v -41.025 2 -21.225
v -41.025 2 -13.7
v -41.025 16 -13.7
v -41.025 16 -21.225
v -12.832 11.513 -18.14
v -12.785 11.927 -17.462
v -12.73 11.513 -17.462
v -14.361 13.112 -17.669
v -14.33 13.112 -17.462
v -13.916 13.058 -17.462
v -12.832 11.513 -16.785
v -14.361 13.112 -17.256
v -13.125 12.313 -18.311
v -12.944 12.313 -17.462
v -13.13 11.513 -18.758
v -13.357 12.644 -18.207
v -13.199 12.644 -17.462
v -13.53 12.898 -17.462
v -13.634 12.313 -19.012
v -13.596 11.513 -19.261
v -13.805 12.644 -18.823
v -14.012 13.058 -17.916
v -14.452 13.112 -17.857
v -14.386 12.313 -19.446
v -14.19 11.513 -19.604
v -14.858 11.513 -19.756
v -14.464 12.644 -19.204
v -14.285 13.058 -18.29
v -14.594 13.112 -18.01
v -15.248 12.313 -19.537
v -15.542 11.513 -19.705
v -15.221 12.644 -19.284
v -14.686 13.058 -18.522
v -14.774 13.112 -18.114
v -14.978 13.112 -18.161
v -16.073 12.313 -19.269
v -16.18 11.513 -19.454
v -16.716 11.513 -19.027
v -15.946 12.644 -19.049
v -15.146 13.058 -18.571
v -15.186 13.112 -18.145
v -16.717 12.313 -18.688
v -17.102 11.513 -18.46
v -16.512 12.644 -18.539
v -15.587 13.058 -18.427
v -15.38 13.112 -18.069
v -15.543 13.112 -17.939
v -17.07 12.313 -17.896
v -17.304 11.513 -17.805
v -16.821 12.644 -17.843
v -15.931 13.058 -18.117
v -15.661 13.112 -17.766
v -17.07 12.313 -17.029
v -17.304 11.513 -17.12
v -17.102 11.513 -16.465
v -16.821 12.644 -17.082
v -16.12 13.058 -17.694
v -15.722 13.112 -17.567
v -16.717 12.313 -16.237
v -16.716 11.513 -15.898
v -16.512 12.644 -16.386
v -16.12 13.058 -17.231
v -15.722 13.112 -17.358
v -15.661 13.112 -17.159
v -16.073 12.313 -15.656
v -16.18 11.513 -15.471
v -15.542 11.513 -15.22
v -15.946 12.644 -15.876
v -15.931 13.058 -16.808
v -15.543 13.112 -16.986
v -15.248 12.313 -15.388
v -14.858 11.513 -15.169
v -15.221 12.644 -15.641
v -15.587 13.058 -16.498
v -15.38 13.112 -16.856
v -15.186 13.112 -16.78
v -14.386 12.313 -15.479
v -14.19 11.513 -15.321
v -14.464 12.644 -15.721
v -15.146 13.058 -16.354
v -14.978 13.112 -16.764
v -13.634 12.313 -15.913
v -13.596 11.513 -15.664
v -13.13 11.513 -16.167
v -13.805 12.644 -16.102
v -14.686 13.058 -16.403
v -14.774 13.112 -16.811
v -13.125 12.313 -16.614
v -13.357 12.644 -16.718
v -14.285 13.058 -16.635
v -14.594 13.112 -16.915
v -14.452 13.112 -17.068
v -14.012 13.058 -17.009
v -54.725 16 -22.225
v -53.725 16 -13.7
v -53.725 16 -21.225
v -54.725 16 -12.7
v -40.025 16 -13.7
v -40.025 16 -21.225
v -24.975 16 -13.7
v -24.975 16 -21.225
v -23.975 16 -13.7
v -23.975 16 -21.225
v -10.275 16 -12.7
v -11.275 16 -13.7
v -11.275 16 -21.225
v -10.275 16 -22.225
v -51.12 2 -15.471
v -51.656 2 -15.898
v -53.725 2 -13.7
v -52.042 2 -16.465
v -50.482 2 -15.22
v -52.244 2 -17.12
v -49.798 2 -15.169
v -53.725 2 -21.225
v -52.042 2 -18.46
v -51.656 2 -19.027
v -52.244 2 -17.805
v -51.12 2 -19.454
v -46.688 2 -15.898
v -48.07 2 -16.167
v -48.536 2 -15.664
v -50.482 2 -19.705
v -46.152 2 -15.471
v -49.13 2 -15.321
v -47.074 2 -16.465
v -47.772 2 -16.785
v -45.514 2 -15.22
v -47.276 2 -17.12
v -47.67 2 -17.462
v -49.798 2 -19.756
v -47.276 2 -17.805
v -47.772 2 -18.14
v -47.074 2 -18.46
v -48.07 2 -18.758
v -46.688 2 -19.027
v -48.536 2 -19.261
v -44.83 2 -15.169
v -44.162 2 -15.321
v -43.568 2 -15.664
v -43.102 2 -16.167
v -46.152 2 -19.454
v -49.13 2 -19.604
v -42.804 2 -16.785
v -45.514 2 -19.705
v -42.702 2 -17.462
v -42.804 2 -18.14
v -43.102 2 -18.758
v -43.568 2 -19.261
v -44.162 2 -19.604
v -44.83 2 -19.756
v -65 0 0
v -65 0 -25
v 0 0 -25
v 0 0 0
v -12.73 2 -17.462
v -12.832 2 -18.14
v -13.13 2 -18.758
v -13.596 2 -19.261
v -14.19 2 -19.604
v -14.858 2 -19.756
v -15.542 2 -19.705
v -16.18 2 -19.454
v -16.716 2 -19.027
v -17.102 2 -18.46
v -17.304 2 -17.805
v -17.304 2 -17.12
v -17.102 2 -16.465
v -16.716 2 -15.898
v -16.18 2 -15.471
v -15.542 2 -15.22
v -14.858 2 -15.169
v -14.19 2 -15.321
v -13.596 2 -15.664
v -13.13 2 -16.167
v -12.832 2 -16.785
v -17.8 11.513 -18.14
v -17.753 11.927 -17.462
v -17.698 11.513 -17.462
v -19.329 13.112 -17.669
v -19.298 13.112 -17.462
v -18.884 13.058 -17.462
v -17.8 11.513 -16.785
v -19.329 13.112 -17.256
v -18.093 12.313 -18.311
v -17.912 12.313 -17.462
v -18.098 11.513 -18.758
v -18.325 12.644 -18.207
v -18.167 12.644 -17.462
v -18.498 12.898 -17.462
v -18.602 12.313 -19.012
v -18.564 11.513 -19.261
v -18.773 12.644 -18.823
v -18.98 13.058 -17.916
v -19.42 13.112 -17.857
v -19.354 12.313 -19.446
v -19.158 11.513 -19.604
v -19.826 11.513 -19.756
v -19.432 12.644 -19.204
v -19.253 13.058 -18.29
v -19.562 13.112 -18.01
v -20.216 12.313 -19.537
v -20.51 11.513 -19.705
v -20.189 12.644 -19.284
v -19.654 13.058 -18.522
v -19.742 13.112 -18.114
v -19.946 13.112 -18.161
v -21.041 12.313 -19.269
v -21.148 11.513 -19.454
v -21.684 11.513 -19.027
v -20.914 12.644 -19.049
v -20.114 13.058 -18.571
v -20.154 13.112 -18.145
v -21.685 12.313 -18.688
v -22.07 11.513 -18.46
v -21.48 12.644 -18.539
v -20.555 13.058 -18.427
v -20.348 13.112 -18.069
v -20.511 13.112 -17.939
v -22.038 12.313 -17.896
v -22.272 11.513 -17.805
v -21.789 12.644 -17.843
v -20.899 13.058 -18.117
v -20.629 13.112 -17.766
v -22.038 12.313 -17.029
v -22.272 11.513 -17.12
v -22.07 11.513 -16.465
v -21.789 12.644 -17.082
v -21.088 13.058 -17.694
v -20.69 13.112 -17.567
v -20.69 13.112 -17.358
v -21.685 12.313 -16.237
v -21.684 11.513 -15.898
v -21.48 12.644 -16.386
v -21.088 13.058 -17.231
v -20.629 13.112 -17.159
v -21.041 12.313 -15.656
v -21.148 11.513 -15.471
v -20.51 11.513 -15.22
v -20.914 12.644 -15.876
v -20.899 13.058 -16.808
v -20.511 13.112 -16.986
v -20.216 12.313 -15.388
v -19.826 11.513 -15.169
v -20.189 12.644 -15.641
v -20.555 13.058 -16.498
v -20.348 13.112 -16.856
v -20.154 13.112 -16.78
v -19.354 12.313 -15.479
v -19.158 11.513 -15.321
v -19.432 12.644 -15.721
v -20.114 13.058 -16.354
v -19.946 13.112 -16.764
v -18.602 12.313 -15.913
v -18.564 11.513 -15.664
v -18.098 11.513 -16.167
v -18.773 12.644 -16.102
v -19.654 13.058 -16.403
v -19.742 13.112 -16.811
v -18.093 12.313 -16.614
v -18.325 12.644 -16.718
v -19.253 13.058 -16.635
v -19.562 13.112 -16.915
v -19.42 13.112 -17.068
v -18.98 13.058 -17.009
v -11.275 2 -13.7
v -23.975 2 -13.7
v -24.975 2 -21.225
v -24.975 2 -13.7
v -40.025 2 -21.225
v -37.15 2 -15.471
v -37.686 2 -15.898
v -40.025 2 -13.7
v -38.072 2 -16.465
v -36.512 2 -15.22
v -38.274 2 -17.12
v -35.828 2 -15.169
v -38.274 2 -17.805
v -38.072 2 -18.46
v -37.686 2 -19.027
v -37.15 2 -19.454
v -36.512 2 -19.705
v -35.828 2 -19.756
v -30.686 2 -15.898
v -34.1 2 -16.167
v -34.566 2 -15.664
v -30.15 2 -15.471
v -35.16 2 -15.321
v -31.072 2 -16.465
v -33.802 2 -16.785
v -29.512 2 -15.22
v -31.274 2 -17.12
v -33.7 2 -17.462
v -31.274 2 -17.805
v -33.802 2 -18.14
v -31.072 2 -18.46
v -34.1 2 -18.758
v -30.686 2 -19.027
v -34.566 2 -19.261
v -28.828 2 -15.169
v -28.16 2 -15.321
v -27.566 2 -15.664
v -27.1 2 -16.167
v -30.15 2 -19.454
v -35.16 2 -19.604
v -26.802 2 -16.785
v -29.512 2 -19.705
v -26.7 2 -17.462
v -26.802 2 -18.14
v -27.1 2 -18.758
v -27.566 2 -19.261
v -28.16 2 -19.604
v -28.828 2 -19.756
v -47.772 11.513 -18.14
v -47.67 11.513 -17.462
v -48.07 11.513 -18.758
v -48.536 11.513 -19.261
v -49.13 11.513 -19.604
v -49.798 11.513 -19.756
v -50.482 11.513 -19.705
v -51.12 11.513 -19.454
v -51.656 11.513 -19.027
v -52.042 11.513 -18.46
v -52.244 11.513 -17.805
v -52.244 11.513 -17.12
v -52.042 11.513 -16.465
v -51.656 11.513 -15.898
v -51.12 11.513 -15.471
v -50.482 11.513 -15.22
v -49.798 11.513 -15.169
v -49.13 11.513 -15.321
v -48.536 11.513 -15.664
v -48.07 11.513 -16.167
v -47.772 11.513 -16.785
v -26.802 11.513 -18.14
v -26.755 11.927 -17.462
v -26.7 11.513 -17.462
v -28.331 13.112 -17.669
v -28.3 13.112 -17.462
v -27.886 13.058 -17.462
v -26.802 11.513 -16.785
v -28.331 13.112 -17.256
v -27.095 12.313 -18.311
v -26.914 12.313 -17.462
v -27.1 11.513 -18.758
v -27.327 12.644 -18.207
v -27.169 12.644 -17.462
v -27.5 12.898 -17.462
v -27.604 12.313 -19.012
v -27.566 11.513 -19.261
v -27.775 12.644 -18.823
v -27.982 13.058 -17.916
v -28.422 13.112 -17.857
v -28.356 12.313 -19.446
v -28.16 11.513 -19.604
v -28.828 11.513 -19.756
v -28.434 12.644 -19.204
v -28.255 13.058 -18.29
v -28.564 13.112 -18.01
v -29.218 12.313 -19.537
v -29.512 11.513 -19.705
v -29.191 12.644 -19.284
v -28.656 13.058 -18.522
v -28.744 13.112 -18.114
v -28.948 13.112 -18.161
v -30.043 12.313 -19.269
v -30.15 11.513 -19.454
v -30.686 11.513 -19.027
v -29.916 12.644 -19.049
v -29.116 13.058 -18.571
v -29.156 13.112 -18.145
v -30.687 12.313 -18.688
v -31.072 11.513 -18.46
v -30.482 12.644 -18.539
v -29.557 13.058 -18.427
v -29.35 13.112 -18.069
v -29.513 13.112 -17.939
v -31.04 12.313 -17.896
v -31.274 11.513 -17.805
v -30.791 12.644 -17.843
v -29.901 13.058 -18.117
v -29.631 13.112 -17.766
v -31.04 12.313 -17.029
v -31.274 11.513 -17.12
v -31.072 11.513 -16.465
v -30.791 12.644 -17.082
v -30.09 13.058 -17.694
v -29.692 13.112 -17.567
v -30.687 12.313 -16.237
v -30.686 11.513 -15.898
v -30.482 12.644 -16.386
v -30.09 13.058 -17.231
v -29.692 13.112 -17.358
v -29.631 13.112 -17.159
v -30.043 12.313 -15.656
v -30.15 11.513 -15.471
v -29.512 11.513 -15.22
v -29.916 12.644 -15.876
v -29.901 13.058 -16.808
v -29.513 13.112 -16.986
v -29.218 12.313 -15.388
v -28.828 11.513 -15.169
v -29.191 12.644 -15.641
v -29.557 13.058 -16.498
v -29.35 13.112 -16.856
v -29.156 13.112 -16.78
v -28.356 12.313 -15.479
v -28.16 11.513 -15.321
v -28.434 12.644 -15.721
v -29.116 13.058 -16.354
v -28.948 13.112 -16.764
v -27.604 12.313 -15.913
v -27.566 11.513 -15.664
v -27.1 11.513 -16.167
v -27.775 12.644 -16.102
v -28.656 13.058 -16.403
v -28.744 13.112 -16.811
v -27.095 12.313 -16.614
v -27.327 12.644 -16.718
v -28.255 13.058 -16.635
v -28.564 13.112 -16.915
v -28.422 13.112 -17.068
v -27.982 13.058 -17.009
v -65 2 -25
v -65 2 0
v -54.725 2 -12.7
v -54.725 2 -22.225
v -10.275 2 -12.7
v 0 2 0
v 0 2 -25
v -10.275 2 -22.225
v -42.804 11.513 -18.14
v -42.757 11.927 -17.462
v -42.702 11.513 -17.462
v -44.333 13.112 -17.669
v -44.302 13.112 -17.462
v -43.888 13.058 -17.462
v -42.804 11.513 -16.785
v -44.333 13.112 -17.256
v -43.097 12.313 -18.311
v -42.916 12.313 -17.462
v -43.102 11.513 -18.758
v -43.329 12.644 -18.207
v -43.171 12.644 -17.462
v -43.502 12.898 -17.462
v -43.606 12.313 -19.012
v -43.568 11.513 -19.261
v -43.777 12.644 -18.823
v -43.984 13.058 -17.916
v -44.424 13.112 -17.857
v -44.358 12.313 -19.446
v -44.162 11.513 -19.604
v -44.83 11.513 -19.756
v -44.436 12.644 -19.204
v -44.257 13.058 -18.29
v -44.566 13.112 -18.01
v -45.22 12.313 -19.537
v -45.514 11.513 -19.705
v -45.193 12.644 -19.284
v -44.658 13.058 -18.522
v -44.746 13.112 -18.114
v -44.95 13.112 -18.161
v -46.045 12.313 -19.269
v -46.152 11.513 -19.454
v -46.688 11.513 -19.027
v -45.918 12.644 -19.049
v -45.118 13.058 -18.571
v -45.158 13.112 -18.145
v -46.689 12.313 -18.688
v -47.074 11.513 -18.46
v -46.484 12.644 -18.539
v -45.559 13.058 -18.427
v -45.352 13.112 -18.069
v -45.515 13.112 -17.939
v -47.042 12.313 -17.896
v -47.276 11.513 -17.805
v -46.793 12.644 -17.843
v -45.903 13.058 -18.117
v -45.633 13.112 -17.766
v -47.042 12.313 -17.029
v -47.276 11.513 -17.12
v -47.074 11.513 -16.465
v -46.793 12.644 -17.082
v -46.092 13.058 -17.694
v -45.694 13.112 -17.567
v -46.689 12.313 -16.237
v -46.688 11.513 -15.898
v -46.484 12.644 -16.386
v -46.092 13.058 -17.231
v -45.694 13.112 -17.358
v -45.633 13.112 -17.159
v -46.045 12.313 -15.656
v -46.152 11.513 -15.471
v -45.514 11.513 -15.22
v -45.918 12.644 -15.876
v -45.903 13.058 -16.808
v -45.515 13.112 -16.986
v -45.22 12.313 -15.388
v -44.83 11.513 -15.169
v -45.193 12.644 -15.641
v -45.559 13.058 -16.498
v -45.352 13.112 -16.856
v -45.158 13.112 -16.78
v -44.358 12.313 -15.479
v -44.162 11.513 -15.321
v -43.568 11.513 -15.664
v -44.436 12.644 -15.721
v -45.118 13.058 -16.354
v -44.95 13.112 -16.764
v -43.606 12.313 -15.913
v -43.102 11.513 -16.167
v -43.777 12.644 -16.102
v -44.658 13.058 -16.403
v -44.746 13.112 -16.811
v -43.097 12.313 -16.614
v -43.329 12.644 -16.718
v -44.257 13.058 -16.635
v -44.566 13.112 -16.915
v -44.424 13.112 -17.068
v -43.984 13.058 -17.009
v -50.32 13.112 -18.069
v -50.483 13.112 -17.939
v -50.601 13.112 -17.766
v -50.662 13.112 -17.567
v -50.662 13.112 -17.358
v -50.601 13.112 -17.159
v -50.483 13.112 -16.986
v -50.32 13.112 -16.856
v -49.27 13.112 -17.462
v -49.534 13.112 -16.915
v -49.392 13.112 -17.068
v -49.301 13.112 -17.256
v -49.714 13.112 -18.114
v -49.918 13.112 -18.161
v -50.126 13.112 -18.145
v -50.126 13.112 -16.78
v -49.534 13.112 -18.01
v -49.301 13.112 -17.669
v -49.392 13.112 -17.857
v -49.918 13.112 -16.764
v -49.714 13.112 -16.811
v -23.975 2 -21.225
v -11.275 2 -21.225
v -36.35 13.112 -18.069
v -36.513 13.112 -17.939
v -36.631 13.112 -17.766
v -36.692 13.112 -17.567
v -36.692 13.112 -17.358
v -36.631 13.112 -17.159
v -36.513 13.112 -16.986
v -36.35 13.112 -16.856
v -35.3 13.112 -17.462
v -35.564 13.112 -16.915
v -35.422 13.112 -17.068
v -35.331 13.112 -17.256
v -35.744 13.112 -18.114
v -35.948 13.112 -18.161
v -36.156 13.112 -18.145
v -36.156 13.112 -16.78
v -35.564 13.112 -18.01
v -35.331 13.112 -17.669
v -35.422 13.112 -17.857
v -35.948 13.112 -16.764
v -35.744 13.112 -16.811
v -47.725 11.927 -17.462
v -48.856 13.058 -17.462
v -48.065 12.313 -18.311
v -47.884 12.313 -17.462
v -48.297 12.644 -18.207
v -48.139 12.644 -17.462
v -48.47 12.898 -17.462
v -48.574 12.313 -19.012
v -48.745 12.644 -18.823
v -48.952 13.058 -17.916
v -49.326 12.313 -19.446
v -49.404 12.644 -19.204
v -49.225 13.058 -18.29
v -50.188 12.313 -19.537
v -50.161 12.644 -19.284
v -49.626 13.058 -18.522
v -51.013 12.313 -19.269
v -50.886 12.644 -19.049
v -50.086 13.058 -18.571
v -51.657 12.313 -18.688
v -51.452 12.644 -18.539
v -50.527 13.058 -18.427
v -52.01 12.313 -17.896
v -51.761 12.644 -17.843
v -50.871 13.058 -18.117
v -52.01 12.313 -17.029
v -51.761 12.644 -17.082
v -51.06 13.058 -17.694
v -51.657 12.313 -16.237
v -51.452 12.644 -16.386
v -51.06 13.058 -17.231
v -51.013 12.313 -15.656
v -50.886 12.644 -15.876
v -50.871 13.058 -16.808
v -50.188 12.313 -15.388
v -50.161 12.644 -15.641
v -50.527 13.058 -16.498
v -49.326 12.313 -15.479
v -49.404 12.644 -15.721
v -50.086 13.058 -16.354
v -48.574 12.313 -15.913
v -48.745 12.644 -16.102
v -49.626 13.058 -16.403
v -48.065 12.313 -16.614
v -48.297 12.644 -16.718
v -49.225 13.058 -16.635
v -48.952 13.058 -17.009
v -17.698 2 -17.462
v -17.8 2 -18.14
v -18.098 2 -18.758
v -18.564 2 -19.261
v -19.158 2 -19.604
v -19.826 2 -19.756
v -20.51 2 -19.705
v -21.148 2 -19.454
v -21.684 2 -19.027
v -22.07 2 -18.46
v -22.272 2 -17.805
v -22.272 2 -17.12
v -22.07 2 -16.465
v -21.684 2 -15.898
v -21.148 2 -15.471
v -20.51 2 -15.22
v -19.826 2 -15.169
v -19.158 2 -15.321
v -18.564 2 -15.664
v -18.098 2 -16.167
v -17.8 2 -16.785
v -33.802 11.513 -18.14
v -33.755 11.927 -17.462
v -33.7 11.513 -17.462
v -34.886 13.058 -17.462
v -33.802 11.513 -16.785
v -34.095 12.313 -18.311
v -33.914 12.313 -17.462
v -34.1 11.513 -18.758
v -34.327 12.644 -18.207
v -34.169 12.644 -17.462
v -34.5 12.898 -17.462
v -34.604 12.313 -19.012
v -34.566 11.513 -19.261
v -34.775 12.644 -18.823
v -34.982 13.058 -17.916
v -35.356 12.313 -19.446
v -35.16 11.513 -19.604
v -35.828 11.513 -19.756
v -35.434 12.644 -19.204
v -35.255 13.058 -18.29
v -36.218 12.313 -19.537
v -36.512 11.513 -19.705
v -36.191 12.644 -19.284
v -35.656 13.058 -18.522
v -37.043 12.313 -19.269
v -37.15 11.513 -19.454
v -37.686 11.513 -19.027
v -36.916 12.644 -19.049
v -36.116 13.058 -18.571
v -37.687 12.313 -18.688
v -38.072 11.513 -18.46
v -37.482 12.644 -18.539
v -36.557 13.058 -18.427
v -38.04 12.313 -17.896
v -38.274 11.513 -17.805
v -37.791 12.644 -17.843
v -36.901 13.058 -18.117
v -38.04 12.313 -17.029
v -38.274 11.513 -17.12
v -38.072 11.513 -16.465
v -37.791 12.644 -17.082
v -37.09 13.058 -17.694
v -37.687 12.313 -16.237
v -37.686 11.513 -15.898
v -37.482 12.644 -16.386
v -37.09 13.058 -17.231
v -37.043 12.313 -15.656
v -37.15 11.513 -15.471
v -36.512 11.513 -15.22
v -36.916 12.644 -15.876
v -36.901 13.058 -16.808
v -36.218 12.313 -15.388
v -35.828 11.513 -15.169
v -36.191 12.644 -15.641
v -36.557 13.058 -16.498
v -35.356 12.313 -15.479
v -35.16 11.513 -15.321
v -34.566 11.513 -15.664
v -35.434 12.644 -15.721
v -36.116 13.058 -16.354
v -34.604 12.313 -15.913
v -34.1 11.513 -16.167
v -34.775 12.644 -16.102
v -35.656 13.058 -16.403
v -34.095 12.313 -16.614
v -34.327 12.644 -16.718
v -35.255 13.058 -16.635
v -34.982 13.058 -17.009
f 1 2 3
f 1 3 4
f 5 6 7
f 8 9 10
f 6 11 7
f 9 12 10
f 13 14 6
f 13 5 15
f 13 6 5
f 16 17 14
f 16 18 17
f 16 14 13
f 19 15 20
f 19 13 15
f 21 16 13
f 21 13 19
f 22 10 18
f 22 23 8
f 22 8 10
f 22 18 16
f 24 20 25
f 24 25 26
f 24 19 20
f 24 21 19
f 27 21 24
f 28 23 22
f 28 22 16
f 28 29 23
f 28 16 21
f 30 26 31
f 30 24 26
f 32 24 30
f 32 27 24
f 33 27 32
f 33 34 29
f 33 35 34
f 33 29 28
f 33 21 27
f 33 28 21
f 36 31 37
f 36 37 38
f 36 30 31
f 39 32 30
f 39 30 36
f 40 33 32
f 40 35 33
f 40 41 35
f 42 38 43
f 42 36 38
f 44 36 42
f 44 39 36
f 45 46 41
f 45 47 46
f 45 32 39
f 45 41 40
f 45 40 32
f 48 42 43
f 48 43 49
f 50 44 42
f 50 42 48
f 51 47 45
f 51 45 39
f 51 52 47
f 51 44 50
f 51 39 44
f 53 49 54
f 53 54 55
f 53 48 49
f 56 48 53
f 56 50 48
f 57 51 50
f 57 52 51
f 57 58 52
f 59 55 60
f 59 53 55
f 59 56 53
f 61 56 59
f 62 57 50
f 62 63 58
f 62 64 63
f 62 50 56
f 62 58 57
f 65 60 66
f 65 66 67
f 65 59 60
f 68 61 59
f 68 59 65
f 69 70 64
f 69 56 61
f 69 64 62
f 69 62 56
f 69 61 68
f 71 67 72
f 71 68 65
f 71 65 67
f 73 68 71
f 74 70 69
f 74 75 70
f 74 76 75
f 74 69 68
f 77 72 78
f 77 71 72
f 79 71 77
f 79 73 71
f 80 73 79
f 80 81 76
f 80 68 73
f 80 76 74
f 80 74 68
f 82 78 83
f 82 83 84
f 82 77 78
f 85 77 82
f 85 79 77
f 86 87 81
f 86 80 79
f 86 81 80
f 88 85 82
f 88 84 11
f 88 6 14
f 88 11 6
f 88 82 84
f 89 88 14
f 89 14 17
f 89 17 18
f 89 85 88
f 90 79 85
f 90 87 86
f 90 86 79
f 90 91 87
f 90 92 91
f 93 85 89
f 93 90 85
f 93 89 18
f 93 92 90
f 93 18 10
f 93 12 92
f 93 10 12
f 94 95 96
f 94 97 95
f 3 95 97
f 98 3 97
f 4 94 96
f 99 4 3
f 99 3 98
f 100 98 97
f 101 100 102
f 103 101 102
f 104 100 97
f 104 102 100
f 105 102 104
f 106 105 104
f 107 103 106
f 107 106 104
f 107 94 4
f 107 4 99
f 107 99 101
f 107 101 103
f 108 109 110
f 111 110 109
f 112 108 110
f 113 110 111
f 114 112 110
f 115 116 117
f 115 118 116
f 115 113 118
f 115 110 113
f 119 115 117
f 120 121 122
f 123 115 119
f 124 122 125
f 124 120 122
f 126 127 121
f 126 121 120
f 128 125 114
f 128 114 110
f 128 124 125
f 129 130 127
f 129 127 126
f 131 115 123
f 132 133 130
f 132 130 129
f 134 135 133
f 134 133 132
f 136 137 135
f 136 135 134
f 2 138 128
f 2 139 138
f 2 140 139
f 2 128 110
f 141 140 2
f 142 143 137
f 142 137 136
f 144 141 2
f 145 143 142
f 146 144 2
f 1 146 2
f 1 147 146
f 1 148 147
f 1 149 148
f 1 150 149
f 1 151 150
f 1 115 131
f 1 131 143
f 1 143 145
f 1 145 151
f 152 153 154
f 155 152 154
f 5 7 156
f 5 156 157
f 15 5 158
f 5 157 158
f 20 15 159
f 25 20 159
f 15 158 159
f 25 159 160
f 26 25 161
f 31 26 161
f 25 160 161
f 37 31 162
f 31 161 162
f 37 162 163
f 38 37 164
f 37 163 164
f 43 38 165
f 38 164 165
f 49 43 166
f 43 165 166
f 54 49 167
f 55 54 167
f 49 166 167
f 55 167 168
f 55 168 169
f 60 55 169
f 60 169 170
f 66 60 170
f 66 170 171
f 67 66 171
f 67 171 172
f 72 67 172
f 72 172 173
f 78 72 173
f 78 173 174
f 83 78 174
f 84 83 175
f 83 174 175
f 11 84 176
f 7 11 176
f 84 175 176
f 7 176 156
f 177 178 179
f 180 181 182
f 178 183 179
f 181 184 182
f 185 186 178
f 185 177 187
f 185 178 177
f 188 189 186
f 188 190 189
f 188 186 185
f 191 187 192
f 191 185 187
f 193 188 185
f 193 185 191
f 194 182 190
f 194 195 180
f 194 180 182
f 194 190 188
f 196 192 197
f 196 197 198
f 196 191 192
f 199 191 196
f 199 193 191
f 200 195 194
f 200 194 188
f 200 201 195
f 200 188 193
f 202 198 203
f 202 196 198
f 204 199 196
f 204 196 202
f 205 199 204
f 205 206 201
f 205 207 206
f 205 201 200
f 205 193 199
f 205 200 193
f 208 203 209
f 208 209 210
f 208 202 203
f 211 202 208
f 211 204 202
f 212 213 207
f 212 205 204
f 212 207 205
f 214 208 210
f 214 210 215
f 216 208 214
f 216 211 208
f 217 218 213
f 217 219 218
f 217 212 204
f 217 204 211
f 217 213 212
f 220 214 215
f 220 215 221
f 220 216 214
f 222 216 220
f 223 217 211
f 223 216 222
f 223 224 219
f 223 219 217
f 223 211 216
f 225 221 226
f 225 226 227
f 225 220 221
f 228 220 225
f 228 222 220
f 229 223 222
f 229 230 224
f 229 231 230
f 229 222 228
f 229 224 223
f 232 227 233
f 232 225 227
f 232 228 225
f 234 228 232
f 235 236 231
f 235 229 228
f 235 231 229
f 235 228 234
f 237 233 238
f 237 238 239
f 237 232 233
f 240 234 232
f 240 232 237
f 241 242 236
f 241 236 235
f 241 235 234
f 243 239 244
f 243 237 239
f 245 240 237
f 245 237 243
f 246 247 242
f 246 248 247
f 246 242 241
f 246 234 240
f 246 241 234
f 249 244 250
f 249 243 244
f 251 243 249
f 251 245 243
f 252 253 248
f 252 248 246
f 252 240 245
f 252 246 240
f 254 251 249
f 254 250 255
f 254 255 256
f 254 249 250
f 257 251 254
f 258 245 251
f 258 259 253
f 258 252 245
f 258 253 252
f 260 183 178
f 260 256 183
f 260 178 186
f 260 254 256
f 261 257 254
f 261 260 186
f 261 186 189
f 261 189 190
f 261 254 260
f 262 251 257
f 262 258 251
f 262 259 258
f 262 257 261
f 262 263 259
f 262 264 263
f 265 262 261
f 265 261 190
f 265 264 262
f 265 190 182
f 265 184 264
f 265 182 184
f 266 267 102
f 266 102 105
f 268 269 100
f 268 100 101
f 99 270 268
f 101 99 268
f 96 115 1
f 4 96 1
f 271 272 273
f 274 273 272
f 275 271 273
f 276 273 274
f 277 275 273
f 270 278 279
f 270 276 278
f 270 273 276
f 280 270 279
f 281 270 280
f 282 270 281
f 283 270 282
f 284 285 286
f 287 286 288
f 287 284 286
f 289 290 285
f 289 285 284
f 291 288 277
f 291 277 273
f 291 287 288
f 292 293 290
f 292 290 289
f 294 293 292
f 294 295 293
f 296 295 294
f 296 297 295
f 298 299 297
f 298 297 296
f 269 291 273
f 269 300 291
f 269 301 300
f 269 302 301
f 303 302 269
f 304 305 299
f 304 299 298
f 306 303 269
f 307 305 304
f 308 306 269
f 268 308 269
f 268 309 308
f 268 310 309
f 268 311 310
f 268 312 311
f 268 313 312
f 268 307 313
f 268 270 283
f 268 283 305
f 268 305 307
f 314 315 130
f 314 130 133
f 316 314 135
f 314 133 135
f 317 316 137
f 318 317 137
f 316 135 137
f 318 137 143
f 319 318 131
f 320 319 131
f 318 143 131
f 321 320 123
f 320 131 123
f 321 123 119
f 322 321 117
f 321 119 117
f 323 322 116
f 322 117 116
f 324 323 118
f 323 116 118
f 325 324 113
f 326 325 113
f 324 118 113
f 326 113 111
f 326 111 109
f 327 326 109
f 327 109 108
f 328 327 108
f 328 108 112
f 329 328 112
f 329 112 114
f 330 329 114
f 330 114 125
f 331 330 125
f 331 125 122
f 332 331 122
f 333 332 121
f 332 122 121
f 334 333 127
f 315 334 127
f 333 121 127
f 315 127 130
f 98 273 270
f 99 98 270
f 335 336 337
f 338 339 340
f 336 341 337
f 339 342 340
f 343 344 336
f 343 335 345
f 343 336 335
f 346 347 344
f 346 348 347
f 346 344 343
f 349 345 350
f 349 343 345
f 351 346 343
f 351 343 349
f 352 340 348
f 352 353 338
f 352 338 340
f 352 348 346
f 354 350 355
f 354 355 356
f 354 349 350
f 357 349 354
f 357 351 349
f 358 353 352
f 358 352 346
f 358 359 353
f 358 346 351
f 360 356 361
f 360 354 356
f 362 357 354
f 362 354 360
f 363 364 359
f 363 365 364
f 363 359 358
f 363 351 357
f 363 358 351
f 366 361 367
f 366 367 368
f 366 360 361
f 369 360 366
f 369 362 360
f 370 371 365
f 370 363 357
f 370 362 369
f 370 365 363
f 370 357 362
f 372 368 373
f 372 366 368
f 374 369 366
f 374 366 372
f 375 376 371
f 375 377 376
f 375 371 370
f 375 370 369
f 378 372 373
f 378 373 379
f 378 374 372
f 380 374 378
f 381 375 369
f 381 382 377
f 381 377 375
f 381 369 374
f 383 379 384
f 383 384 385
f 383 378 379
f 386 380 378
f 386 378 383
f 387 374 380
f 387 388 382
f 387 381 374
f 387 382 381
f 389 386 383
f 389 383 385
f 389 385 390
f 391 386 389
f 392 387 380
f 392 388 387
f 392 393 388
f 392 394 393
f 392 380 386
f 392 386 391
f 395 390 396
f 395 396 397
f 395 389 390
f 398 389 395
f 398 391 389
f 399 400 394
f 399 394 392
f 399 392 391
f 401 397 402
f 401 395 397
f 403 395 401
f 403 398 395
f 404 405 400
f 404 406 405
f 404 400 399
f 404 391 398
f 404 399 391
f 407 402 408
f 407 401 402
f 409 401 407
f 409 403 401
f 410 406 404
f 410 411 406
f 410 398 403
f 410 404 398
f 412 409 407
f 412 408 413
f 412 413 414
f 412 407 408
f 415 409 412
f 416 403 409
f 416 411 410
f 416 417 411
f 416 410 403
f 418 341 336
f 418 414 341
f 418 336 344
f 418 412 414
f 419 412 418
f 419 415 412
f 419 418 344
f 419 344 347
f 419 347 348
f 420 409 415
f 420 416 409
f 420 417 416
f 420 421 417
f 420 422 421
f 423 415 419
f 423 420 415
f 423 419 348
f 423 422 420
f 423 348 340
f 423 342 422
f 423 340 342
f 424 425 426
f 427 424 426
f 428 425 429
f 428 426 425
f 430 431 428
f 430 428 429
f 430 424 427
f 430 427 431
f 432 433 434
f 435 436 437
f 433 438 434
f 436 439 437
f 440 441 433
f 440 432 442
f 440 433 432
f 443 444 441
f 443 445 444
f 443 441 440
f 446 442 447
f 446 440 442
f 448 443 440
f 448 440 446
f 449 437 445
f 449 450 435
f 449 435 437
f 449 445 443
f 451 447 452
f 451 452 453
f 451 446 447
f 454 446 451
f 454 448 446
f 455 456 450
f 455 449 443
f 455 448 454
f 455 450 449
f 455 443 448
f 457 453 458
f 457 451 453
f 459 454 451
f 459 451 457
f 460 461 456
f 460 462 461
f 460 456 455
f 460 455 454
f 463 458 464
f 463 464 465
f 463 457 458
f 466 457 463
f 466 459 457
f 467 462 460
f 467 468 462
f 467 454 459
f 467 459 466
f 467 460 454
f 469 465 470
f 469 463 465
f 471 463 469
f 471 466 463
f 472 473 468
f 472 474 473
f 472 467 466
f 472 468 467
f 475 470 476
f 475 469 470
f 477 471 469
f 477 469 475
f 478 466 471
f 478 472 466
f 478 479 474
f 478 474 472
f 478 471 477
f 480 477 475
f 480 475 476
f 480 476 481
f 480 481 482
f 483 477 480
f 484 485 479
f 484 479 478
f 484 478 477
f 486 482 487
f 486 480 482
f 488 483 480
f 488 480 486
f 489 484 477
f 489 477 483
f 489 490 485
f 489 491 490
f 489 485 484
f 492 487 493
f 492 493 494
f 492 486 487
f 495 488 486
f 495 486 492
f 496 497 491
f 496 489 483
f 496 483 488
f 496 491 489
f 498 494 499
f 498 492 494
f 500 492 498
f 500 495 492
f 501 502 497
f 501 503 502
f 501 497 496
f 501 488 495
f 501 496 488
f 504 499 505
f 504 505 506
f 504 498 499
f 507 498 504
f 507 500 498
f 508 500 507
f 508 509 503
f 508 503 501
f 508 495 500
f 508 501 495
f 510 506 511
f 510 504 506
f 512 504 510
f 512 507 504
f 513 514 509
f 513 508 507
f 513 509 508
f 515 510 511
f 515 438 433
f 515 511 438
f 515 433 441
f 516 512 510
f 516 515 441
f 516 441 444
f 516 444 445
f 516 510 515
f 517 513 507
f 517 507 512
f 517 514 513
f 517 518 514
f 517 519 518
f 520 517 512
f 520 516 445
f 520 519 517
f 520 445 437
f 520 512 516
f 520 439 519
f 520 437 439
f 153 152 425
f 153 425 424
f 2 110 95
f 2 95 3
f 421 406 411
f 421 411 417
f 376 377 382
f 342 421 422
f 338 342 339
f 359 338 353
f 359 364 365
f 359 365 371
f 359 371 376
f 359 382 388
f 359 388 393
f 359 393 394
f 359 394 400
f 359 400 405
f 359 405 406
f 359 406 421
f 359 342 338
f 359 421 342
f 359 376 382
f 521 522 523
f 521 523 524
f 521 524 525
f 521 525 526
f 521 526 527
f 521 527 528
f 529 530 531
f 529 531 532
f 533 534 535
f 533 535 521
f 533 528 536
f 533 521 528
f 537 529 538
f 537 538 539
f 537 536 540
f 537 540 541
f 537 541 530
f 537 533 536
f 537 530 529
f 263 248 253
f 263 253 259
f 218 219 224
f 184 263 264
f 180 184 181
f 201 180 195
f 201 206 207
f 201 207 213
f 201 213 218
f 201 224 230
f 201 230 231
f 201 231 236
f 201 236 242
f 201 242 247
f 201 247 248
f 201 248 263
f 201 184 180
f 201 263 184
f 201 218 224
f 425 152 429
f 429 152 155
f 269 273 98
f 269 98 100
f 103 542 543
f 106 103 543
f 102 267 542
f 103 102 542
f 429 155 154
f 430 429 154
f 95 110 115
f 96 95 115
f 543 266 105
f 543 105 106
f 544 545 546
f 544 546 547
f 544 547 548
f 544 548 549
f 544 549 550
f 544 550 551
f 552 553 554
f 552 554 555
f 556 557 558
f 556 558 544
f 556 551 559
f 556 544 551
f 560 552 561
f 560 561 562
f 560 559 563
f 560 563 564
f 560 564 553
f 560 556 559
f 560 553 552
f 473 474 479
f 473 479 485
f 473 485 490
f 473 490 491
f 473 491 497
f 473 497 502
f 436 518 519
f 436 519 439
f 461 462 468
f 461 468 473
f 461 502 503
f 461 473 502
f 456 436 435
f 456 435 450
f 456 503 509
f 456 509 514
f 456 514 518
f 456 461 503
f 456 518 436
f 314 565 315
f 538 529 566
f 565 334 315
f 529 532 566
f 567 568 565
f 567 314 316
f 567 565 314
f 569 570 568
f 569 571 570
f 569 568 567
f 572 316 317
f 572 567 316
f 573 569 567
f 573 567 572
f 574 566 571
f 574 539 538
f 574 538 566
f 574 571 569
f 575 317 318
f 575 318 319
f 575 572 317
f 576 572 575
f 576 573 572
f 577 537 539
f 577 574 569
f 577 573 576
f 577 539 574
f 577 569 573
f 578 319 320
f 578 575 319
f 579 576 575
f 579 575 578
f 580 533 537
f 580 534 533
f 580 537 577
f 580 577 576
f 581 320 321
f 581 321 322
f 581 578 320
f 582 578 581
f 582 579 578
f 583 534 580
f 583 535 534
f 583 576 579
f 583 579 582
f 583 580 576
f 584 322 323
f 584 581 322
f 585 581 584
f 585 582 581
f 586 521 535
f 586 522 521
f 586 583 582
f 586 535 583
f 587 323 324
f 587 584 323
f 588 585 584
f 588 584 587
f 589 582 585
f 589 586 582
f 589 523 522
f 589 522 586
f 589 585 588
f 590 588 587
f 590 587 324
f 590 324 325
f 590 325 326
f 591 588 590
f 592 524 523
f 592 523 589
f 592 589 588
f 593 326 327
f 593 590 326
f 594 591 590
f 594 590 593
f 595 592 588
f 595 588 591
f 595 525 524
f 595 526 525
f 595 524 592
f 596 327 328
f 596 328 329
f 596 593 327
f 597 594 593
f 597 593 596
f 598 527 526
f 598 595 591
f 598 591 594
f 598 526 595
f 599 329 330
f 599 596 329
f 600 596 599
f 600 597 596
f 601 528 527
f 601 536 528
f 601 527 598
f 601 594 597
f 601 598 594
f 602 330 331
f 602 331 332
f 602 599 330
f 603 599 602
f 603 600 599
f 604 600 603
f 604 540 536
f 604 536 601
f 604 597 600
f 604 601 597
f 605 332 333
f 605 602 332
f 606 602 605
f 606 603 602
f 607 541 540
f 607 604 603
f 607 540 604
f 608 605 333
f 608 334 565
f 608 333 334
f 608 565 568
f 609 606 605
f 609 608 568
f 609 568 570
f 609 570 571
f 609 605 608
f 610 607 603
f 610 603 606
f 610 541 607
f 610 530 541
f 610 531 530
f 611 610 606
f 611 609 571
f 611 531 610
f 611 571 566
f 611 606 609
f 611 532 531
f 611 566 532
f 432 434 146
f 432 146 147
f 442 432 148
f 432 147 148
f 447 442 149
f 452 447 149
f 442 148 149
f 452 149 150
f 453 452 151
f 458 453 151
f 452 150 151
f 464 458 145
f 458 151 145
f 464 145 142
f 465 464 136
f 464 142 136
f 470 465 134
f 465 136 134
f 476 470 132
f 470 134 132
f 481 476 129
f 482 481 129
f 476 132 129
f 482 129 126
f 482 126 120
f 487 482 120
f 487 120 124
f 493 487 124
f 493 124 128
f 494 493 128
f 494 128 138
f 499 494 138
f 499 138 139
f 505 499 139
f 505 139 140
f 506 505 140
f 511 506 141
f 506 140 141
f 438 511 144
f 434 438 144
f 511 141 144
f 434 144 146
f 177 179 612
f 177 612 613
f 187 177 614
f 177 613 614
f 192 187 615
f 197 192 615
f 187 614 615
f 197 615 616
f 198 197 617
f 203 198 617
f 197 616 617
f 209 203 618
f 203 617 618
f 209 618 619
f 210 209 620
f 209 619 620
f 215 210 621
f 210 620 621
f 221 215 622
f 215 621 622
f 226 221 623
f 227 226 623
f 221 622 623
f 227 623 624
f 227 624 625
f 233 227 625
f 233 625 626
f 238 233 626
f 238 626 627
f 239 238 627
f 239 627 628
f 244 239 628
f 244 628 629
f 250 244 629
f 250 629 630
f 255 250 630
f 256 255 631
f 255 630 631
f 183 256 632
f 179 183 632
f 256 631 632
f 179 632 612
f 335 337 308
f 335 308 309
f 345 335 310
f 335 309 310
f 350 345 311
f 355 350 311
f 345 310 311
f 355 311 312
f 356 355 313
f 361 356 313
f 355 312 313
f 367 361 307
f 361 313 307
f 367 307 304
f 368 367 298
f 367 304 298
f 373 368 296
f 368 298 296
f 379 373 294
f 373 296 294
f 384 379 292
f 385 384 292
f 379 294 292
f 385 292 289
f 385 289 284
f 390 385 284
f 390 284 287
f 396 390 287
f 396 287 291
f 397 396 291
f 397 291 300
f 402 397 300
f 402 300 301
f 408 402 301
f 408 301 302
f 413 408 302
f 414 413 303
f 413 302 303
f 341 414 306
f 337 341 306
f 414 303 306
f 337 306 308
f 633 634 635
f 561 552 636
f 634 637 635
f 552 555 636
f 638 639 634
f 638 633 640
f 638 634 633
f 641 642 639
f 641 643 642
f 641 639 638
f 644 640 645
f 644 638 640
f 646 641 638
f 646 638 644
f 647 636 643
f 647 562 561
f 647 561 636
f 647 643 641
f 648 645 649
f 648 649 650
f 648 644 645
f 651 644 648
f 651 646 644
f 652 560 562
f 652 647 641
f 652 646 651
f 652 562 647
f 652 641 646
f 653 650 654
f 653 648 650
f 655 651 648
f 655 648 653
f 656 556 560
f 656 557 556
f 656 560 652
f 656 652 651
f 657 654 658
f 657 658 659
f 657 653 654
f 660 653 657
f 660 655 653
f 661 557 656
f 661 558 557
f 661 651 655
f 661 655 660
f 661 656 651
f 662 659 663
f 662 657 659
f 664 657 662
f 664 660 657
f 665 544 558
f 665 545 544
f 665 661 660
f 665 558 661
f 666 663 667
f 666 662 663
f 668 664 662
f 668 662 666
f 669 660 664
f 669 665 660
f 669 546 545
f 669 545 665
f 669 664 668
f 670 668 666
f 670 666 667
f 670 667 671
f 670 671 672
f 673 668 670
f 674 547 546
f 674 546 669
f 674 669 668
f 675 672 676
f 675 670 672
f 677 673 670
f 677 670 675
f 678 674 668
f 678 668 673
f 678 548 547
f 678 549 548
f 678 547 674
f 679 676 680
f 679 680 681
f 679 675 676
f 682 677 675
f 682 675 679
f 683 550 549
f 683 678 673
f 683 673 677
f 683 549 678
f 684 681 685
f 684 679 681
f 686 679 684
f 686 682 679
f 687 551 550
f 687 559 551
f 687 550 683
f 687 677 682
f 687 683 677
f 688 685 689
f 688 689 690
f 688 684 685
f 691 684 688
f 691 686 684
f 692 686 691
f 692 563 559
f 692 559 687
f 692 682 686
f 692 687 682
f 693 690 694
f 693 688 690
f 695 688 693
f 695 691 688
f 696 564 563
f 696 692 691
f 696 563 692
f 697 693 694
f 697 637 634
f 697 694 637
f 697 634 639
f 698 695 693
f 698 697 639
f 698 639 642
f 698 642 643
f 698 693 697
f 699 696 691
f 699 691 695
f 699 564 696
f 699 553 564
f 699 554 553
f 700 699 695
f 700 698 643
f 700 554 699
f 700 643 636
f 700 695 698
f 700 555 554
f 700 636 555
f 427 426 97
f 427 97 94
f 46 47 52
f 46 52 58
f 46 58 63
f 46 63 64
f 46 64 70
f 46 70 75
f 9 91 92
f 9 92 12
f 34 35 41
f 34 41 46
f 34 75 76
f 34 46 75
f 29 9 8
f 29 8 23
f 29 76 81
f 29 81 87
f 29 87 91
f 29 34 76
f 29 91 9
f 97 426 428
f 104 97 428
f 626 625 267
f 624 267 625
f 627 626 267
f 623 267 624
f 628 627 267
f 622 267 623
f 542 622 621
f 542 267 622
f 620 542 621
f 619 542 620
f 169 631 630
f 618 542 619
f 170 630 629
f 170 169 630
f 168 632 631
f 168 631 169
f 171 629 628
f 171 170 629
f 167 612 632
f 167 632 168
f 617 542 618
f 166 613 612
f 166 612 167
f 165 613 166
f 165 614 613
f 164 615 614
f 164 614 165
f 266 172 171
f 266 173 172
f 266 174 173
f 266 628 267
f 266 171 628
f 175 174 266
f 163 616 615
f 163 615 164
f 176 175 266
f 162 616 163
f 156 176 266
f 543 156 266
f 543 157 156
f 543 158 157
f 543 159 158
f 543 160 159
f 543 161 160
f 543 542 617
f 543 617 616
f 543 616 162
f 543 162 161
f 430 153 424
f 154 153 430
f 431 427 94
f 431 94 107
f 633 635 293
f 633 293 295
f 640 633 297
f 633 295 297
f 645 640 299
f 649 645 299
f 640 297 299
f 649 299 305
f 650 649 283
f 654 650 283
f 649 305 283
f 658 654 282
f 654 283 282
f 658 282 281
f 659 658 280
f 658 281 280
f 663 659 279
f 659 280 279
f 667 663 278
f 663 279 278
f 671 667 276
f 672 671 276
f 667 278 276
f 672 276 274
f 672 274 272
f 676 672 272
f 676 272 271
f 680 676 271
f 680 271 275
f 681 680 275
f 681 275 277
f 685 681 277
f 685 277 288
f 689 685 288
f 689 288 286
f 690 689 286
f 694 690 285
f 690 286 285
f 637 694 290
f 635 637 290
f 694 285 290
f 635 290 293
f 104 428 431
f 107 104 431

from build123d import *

# Parameters (mm, degrees)
SKETCH1_W           = 65
SKETCH1_H           = 25
BOSS_EXTRUDE1_DEPTH = 2
SKETCH2_W           = 44.45
SKETCH2_H           = 9.525
SKETCH2_W_2         = 12.7
SKETCH2_H_2         = 7.525
SKETCH2_W_3         = 15.049999936
BOSS_EXTRUDE2_DEPTH = 14
SKETCH3_R           = 2.299999953
BOSS_EXTRUDE4_DEPTH = 11.1125
FILLET2_R           = 1.6


with BuildPart() as part:
    # Sketch1 → Boss-Extrude1 (new body)
    with BuildSketch(Plane(origin=(0, 0, 0), x_dir=(1, 0, 0), z_dir=(0, 1, 0))):
        with Locations((-32.5, 12.5)):
            Rectangle(SKETCH1_W, SKETCH1_H)
    extrude(amount=BOSS_EXTRUDE1_DEPTH)

    # Sketch2 → Boss-Extrude2 (add)
    with BuildSketch(Plane(origin=(0, 2, 0), x_dir=(1, 0, 0), z_dir=(0, 1, 0))):
        with Locations((-32.5, 17.4625)):
            Rectangle(SKETCH2_W, SKETCH2_H)
        with Locations((-47.375, 17.4625)):
            Rectangle(SKETCH2_W_2, SKETCH2_H_2, mode=Mode.SUBTRACT)
        with Locations((-17.625, 17.4625)):
            Rectangle(SKETCH2_W_2, SKETCH2_H_2, mode=Mode.SUBTRACT)
        with Locations((-32.5, 17.4625)):
            Rectangle(SKETCH2_W_3, SKETCH2_H_2, mode=Mode.SUBTRACT)
    extrude(amount=BOSS_EXTRUDE2_DEPTH)

    # Sketch3 → Boss-Extrude4 (add)
    with BuildSketch(Plane(origin=(0, 2, 0), x_dir=(1, 0, 0), z_dir=(0, 1, 0))):
        with Locations((-36, 17.4625)):
            Circle(SKETCH3_R)
        with Locations((-49.97, 17.4625)):
            Circle(SKETCH3_R)
        with Locations((-19.998, 17.4625)):
            Circle(SKETCH3_R)
        with Locations((-29, 17.4625)):
            Circle(SKETCH3_R)
        with Locations((-15.03, 17.4625)):
            Circle(SKETCH3_R)
        with Locations((-45.002, 17.4625)):
            Circle(SKETCH3_R)
    extrude(amount=BOSS_EXTRUDE4_DEPTH)

    # Fillet2
    fillet2_edges = [part.edges().sort_by_distance(p)[0] for p in [
        (-38.299999953, 13.1125, -17.4625),
        (-52.269999953, 13.1125, -17.4625),
        (-22.297999953, 13.1125, -17.4625),
        (-31.299999953, 13.1125, -17.4625),
        (-17.329999953, 13.1125, -17.4625),
        (-47.301999953, 13.1125, -17.4625),
    ]]
    fillet(fillet2_edges, radius=FILLET2_R)


solid = part.part
